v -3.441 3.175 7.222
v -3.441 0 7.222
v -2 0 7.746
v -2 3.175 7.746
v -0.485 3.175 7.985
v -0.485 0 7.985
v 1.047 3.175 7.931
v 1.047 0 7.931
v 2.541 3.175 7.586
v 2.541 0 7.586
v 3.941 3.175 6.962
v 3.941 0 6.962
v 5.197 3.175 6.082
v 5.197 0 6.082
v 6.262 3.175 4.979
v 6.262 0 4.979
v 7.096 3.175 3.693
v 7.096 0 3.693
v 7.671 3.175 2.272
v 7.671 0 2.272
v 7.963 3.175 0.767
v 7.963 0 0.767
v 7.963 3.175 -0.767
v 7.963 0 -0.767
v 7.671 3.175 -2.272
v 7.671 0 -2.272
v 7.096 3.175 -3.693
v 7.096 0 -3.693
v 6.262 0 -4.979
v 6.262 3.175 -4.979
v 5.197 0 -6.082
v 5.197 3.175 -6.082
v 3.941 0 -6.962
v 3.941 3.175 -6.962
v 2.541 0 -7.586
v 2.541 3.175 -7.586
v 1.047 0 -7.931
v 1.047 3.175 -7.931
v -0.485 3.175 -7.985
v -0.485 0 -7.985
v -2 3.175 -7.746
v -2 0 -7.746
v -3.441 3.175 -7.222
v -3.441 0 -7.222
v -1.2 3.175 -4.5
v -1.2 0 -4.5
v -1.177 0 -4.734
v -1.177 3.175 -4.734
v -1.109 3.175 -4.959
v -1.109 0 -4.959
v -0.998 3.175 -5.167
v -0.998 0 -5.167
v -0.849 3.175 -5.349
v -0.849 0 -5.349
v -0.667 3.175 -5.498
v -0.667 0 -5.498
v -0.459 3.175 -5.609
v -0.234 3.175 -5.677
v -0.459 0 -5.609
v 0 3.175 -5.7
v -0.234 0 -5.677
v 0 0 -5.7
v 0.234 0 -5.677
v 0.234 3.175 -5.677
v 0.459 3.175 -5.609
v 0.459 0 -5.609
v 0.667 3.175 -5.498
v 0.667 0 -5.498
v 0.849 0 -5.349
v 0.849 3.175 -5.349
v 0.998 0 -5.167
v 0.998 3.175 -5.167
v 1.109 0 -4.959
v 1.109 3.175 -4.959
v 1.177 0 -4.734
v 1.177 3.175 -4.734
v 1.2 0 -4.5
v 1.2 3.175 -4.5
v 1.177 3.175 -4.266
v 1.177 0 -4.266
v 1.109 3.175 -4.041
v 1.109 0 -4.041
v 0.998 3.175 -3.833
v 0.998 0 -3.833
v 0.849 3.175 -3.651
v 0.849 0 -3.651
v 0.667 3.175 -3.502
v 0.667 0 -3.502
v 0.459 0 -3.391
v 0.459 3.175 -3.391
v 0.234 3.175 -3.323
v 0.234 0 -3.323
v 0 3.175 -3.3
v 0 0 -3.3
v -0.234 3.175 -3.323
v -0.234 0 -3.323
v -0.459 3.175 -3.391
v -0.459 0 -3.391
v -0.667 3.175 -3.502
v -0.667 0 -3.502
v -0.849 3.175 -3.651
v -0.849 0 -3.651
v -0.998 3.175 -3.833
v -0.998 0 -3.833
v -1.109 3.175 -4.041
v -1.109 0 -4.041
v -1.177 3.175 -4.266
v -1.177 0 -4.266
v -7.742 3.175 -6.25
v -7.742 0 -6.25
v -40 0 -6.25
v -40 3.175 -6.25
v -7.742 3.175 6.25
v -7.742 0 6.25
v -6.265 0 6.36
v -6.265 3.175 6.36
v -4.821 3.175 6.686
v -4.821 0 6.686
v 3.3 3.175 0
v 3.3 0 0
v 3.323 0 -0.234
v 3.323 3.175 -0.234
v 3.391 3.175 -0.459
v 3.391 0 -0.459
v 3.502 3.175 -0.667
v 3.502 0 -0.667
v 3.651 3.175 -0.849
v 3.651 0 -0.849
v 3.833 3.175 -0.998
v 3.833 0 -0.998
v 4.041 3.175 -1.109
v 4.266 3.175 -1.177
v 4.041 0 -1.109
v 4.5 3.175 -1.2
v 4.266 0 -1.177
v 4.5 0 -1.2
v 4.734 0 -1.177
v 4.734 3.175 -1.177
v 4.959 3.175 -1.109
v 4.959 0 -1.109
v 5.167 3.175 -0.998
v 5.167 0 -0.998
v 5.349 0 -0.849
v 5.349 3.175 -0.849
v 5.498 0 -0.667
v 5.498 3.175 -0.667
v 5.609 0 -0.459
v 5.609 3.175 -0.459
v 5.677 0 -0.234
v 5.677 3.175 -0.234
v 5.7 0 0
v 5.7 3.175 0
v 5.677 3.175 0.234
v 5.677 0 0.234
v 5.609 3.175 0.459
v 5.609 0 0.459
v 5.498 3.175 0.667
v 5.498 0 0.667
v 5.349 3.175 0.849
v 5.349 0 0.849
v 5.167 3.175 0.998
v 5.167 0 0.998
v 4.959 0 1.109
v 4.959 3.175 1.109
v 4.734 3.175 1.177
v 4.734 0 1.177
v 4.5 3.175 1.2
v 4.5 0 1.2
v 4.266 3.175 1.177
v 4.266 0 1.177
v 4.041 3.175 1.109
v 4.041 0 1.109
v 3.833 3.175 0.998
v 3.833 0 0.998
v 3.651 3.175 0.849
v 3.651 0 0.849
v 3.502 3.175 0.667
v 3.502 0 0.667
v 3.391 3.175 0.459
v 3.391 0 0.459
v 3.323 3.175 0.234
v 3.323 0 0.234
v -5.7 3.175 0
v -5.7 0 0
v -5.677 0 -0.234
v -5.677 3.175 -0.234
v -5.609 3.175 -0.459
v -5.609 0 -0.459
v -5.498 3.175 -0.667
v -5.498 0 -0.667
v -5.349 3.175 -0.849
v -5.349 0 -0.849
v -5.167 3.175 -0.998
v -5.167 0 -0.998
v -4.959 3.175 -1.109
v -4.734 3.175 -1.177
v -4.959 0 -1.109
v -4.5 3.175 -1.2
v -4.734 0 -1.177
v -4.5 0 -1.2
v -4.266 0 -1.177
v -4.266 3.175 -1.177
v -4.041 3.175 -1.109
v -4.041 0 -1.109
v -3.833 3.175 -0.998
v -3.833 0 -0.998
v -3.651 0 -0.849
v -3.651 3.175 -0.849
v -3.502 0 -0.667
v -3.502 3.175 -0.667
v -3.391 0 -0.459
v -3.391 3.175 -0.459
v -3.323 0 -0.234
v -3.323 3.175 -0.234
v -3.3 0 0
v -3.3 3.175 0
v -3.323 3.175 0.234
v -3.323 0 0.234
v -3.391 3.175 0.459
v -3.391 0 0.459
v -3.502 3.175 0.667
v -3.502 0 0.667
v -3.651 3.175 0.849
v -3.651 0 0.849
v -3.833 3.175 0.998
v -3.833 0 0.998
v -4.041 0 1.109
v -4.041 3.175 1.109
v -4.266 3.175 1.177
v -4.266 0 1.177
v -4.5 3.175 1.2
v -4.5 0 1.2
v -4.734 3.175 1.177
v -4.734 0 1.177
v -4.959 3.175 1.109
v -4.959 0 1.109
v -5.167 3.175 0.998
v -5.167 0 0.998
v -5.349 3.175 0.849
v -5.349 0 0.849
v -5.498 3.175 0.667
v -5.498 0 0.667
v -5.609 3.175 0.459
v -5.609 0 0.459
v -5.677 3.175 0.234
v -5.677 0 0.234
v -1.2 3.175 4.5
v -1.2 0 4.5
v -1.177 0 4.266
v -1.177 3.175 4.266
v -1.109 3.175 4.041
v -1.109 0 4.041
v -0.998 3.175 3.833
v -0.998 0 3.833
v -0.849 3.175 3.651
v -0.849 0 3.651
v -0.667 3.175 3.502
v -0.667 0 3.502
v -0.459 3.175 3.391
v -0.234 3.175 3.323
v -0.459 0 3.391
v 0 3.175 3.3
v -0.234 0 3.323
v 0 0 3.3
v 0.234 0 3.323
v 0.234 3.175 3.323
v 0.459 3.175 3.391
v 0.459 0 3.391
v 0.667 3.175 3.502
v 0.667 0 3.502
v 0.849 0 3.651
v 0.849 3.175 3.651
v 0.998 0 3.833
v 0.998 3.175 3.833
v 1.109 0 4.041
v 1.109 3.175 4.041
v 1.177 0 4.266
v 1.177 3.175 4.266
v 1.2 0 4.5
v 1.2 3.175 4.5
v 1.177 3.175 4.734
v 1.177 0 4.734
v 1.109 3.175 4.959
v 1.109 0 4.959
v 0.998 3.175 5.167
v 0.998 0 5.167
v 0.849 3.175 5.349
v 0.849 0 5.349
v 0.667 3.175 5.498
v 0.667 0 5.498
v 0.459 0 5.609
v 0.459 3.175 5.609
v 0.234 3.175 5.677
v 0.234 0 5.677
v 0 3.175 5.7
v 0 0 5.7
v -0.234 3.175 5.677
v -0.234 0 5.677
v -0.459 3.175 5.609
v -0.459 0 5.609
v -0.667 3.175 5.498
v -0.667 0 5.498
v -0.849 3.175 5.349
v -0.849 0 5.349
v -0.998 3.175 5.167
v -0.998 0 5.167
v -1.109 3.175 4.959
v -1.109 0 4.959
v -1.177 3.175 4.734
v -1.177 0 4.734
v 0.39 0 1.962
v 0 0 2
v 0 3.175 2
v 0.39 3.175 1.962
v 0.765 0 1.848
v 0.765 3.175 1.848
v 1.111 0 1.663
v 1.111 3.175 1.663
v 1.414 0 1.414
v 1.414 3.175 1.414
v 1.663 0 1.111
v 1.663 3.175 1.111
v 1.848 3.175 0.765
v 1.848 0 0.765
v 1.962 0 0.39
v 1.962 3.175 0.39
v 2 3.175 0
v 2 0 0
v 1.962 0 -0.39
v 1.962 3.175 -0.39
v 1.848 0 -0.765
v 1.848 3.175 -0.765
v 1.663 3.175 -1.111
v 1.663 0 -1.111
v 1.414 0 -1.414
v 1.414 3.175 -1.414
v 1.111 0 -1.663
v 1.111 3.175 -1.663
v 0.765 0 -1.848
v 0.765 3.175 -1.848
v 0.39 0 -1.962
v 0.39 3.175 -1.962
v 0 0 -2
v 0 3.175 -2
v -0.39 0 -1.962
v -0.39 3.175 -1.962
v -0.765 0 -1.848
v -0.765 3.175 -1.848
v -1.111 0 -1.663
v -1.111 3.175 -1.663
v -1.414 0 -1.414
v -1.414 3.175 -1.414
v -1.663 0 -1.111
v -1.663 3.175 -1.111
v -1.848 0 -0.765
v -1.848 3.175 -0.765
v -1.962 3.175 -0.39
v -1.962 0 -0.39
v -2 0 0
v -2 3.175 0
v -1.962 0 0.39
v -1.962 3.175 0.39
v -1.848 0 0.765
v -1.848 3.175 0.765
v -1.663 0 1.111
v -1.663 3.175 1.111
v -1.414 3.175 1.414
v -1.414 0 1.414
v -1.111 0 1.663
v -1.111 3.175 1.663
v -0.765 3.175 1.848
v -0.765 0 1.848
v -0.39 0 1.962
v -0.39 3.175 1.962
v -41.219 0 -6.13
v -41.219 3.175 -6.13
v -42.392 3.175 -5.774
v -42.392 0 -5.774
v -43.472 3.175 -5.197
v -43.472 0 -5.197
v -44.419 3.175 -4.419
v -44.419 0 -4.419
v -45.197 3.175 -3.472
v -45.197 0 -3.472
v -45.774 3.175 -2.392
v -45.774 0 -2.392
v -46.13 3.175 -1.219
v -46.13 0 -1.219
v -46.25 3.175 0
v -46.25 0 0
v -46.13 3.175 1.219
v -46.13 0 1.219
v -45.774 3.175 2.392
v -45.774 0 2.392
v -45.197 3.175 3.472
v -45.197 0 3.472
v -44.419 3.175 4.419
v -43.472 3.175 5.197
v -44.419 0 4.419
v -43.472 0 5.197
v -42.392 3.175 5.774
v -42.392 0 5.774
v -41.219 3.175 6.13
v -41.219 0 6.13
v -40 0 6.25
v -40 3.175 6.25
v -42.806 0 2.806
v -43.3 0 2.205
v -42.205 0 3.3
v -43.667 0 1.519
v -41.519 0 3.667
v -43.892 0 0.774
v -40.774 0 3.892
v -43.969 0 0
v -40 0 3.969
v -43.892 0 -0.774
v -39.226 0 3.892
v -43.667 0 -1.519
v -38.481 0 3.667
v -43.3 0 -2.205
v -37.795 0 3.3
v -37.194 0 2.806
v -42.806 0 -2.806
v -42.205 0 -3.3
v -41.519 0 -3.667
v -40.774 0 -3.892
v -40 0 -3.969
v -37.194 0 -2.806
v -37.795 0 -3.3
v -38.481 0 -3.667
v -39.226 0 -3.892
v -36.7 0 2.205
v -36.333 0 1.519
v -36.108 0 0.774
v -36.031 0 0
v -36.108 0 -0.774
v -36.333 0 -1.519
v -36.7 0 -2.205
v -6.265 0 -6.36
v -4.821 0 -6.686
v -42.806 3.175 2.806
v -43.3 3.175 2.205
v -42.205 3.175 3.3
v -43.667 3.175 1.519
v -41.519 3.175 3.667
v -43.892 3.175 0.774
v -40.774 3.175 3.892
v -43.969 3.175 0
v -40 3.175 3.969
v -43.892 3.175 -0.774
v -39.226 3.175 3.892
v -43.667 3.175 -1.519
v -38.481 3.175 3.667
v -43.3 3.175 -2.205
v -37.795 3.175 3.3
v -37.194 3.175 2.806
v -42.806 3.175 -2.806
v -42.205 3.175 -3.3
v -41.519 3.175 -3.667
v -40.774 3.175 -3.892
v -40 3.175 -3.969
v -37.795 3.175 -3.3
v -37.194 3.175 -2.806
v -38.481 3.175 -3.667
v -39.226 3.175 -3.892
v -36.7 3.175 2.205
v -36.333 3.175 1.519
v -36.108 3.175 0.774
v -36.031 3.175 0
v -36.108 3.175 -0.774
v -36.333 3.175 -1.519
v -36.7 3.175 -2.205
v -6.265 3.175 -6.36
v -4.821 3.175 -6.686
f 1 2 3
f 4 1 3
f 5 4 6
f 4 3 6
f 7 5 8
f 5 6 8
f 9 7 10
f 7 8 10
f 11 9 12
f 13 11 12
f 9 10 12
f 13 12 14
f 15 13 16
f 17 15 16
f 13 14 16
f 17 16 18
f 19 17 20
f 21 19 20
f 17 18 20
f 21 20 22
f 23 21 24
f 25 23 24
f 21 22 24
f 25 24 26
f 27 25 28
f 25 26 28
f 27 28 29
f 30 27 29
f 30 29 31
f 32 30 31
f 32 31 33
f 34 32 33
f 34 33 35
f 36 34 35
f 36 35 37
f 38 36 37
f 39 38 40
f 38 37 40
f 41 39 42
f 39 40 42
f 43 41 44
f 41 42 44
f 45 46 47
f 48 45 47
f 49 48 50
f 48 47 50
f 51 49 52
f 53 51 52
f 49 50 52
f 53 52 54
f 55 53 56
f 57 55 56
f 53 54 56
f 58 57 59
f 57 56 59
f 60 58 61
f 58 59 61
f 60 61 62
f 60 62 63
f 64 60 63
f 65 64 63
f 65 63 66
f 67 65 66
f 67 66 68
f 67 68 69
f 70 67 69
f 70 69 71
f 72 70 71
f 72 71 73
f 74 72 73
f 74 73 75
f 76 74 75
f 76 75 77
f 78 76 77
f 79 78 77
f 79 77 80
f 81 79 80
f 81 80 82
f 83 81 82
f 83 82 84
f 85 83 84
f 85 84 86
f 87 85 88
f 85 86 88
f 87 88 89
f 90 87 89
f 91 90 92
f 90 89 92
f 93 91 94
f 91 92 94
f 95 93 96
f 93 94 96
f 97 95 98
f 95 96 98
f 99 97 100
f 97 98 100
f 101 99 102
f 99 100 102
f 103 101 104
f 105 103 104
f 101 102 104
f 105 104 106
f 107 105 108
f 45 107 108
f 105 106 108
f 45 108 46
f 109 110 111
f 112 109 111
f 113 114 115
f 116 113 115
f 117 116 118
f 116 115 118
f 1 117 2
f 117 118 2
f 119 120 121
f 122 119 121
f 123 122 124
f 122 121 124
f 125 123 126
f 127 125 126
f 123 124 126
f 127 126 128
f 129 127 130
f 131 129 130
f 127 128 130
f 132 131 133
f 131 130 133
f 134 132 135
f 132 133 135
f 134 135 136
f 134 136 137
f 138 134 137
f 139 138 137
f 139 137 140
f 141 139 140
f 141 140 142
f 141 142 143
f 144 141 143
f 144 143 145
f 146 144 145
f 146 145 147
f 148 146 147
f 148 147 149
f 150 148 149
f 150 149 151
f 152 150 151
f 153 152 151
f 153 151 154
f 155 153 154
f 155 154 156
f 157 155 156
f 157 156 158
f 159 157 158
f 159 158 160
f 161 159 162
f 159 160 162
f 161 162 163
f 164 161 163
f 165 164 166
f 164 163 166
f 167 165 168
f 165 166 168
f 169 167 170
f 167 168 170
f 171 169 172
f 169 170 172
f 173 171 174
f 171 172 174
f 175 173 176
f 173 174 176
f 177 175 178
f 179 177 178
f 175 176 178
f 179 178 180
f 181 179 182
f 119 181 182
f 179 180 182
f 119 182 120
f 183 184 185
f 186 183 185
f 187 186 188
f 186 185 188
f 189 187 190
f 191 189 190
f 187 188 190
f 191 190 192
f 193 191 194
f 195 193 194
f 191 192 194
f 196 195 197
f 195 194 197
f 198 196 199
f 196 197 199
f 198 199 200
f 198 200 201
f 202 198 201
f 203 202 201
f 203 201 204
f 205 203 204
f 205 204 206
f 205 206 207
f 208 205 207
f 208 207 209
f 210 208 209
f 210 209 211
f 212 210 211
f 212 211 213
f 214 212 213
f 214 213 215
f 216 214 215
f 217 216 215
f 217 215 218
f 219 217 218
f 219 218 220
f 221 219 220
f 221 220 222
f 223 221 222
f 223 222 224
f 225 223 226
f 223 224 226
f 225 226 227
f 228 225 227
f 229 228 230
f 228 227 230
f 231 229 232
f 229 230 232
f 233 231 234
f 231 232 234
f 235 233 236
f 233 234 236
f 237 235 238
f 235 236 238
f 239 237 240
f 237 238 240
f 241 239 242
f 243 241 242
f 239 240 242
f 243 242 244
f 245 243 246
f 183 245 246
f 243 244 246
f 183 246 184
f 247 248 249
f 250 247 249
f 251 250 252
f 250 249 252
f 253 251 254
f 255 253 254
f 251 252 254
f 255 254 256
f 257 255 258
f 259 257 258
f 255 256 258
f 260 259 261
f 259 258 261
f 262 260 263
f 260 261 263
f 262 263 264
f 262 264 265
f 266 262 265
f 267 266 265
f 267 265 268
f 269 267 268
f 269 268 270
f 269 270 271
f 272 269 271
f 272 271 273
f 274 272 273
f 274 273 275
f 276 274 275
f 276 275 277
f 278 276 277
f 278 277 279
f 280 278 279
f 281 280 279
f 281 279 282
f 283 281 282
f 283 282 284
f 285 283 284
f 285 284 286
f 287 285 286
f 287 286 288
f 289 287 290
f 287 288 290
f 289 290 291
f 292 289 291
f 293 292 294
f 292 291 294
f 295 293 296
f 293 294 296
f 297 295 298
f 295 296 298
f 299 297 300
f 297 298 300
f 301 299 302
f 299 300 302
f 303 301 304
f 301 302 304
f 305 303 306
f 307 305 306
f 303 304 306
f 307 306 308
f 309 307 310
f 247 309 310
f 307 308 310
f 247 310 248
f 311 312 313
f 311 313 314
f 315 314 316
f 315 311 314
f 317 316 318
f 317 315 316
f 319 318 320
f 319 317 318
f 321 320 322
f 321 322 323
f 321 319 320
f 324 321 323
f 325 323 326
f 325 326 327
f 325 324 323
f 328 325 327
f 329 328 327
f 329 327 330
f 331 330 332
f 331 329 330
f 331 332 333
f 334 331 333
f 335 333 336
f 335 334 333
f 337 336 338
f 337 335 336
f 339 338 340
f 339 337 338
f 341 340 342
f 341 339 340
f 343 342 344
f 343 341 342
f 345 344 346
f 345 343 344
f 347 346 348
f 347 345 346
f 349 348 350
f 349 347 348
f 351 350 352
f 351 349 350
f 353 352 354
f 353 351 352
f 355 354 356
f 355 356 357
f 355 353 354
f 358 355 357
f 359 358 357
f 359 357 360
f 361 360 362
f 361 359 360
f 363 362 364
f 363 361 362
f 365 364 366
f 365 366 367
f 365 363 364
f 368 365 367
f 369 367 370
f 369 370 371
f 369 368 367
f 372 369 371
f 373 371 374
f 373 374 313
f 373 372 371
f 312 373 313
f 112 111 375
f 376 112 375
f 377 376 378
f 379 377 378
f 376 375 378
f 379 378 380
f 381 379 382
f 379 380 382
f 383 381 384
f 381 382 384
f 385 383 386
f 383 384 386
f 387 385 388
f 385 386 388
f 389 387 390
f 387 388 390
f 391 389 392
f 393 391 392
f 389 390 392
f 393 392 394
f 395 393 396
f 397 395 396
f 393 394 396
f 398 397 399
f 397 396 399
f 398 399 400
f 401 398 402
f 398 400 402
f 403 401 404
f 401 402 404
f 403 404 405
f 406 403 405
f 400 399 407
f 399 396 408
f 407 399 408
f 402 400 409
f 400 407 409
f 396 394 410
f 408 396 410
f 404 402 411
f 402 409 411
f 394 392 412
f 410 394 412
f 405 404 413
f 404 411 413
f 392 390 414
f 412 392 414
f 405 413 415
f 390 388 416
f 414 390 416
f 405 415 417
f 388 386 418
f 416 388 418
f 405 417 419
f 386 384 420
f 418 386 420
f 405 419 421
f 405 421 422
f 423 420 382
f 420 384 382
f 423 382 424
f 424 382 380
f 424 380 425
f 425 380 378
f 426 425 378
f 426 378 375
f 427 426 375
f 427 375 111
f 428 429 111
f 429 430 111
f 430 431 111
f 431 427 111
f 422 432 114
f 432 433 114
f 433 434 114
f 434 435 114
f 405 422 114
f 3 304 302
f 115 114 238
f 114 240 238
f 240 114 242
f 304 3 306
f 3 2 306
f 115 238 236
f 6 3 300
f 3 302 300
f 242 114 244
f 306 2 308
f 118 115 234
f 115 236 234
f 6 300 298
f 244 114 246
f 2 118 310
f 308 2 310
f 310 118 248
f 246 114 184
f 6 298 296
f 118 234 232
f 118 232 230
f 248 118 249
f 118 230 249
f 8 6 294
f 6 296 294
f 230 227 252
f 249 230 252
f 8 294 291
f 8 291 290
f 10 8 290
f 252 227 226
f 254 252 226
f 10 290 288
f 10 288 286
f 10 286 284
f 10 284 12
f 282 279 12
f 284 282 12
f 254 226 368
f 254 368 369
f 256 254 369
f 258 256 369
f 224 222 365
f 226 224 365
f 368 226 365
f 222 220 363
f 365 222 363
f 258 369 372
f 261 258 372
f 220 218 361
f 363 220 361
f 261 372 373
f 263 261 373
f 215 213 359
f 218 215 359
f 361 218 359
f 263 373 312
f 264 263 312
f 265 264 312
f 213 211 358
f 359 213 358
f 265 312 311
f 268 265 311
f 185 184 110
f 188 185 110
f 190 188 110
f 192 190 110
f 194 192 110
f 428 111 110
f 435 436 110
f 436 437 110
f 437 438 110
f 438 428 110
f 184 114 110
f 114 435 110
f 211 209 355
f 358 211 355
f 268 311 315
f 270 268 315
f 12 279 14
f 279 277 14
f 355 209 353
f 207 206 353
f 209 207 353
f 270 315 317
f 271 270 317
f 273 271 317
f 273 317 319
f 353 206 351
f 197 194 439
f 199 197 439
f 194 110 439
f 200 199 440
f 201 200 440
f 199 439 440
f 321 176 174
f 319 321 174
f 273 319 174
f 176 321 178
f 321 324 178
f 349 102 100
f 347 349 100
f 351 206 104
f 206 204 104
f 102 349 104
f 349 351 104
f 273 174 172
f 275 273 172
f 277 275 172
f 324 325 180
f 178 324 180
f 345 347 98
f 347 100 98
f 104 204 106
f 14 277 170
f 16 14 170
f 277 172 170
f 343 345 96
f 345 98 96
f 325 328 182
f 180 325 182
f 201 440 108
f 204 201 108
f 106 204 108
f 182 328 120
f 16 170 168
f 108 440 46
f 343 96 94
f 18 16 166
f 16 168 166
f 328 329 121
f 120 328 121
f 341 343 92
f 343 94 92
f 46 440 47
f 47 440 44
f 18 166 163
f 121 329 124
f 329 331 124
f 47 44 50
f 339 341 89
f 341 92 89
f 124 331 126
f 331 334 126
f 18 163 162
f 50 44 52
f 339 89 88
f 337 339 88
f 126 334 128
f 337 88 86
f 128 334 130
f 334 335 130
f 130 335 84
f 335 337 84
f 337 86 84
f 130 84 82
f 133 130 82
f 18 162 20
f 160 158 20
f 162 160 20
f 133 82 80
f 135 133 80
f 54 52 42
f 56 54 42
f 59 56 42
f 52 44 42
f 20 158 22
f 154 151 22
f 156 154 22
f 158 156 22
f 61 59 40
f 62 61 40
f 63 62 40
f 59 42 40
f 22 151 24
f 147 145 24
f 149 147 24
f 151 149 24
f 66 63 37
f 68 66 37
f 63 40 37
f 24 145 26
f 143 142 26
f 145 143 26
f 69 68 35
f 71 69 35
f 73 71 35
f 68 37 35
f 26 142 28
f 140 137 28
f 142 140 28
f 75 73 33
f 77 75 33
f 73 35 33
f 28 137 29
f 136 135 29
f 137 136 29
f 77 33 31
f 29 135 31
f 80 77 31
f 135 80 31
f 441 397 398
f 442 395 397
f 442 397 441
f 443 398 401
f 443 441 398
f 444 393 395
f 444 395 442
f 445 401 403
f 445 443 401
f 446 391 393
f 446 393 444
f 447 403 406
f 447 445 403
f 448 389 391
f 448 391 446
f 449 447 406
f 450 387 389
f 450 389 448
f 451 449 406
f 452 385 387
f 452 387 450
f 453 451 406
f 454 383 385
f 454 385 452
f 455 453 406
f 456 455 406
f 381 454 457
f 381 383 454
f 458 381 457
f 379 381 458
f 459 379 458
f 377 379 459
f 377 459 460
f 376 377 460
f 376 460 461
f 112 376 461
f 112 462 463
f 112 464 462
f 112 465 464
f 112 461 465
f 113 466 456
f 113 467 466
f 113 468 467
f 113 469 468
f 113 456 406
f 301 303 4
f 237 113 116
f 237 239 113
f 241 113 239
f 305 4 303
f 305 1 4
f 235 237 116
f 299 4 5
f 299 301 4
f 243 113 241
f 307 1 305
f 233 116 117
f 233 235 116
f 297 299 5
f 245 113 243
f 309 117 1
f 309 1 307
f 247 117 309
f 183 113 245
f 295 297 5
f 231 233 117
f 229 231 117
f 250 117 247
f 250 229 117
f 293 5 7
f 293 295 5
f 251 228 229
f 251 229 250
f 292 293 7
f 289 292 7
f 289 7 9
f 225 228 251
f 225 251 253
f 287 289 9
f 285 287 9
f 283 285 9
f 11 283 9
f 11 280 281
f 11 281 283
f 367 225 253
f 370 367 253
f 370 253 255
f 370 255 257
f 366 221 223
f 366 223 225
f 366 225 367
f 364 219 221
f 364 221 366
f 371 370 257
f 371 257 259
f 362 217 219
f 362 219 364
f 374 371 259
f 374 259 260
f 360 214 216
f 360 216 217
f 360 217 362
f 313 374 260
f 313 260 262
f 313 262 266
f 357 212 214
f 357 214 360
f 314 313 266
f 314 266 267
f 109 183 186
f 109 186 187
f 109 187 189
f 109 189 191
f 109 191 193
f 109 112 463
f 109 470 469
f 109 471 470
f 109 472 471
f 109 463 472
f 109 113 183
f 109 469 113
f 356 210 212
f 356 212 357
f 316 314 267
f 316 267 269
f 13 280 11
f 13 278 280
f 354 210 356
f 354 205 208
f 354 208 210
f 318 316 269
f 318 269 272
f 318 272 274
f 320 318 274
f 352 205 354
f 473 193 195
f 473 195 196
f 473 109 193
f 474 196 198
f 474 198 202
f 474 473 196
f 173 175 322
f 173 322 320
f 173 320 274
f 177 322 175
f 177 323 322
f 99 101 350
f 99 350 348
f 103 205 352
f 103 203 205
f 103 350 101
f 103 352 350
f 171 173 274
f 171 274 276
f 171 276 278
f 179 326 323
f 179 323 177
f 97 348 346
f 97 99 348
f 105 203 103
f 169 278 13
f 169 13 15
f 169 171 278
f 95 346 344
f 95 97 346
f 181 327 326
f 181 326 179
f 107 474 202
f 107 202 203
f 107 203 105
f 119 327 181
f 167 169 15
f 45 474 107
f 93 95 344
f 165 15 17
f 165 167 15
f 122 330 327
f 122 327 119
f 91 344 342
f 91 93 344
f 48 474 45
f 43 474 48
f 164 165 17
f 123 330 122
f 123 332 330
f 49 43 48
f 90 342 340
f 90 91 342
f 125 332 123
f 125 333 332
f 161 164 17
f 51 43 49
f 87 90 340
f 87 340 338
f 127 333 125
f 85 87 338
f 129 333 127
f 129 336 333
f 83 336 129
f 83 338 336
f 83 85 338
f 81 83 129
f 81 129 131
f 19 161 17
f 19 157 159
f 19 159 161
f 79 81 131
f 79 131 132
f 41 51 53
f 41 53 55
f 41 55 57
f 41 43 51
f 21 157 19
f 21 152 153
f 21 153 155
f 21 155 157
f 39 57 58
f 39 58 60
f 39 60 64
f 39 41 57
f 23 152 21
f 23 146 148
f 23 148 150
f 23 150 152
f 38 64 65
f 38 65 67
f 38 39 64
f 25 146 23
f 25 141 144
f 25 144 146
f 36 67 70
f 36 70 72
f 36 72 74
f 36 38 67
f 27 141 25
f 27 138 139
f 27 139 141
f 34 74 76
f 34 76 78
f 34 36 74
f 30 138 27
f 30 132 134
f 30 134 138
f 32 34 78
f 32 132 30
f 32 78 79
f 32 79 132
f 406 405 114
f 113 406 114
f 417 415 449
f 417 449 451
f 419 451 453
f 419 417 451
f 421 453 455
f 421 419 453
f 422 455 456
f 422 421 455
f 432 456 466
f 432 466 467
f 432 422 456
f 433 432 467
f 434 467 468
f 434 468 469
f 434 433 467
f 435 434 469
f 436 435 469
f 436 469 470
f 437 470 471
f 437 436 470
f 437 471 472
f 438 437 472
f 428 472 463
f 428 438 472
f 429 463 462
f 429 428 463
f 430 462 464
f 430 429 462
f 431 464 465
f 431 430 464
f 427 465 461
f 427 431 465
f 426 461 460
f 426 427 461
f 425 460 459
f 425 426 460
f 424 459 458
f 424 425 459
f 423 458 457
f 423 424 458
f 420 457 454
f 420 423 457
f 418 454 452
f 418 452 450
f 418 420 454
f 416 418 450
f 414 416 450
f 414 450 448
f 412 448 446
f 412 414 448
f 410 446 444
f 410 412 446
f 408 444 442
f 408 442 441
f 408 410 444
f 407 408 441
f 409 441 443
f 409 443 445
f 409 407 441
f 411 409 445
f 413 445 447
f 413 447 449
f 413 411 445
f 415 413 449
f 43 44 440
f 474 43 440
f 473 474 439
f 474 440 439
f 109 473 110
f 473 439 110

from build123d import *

# Parameters (mm, degrees)
SKETCH1_R            = 3.96875
SKETCH1_R_2          = 2
BOSS_EXTRUDE1_DEPTH  = 3.175
M2_CLEARANCE_HOLE1_D = 2.4


with BuildPart() as part:
    # Sketch1 → Boss-Extrude1 (new body)
    with BuildSketch(Plane(origin=(0, 0, 0), x_dir=(1, 0, 0), z_dir=(0, 1, 0))):
        with BuildLine():
            Line((-7.741931284, 6.25), (-40, 6.25))
            ThreePointArc((-40, 6.25), (-46.25, 0), (-40, -6.25))
            Line((-40, -6.25), (-7.741931284, -6.25))
            ThreePointArc((-7.741931284, -6.25), (-5.537138524, -6.496083408), (-3.440858348, -7.222222222))
            ThreePointArc((-3.440858348, -7.222222222), (8, 0), (-3.440858348, 7.222222222))
            ThreePointArc((-3.440858348, 7.222222222), (-5.537138524, 6.496083408), (-7.741931284, 6.25))
        make_face()
        with Locations(Location((-40, 0, 0), (0, 0, 270))):
            Circle(SKETCH1_R, mode=Mode.SUBTRACT)
        with Locations(Location((0, 0, 0), (0, 0, 270))):
            Circle(SKETCH1_R_2, mode=Mode.SUBTRACT)
    extrude(amount=BOSS_EXTRUDE1_DEPTH)

    # M2 Clearance Hole1 (through all)
    with Locations(Plane(origin=(0, 3.175, 0), x_dir=(1, 0, 0), z_dir=(0, 1, 0))):
        with Locations((-4.5, 0), (0, 4.5), (4.5, 0), (0, -4.5)):
            Hole(M2_CLEARANCE_HOLE1_D / 2)


solid = part.part
